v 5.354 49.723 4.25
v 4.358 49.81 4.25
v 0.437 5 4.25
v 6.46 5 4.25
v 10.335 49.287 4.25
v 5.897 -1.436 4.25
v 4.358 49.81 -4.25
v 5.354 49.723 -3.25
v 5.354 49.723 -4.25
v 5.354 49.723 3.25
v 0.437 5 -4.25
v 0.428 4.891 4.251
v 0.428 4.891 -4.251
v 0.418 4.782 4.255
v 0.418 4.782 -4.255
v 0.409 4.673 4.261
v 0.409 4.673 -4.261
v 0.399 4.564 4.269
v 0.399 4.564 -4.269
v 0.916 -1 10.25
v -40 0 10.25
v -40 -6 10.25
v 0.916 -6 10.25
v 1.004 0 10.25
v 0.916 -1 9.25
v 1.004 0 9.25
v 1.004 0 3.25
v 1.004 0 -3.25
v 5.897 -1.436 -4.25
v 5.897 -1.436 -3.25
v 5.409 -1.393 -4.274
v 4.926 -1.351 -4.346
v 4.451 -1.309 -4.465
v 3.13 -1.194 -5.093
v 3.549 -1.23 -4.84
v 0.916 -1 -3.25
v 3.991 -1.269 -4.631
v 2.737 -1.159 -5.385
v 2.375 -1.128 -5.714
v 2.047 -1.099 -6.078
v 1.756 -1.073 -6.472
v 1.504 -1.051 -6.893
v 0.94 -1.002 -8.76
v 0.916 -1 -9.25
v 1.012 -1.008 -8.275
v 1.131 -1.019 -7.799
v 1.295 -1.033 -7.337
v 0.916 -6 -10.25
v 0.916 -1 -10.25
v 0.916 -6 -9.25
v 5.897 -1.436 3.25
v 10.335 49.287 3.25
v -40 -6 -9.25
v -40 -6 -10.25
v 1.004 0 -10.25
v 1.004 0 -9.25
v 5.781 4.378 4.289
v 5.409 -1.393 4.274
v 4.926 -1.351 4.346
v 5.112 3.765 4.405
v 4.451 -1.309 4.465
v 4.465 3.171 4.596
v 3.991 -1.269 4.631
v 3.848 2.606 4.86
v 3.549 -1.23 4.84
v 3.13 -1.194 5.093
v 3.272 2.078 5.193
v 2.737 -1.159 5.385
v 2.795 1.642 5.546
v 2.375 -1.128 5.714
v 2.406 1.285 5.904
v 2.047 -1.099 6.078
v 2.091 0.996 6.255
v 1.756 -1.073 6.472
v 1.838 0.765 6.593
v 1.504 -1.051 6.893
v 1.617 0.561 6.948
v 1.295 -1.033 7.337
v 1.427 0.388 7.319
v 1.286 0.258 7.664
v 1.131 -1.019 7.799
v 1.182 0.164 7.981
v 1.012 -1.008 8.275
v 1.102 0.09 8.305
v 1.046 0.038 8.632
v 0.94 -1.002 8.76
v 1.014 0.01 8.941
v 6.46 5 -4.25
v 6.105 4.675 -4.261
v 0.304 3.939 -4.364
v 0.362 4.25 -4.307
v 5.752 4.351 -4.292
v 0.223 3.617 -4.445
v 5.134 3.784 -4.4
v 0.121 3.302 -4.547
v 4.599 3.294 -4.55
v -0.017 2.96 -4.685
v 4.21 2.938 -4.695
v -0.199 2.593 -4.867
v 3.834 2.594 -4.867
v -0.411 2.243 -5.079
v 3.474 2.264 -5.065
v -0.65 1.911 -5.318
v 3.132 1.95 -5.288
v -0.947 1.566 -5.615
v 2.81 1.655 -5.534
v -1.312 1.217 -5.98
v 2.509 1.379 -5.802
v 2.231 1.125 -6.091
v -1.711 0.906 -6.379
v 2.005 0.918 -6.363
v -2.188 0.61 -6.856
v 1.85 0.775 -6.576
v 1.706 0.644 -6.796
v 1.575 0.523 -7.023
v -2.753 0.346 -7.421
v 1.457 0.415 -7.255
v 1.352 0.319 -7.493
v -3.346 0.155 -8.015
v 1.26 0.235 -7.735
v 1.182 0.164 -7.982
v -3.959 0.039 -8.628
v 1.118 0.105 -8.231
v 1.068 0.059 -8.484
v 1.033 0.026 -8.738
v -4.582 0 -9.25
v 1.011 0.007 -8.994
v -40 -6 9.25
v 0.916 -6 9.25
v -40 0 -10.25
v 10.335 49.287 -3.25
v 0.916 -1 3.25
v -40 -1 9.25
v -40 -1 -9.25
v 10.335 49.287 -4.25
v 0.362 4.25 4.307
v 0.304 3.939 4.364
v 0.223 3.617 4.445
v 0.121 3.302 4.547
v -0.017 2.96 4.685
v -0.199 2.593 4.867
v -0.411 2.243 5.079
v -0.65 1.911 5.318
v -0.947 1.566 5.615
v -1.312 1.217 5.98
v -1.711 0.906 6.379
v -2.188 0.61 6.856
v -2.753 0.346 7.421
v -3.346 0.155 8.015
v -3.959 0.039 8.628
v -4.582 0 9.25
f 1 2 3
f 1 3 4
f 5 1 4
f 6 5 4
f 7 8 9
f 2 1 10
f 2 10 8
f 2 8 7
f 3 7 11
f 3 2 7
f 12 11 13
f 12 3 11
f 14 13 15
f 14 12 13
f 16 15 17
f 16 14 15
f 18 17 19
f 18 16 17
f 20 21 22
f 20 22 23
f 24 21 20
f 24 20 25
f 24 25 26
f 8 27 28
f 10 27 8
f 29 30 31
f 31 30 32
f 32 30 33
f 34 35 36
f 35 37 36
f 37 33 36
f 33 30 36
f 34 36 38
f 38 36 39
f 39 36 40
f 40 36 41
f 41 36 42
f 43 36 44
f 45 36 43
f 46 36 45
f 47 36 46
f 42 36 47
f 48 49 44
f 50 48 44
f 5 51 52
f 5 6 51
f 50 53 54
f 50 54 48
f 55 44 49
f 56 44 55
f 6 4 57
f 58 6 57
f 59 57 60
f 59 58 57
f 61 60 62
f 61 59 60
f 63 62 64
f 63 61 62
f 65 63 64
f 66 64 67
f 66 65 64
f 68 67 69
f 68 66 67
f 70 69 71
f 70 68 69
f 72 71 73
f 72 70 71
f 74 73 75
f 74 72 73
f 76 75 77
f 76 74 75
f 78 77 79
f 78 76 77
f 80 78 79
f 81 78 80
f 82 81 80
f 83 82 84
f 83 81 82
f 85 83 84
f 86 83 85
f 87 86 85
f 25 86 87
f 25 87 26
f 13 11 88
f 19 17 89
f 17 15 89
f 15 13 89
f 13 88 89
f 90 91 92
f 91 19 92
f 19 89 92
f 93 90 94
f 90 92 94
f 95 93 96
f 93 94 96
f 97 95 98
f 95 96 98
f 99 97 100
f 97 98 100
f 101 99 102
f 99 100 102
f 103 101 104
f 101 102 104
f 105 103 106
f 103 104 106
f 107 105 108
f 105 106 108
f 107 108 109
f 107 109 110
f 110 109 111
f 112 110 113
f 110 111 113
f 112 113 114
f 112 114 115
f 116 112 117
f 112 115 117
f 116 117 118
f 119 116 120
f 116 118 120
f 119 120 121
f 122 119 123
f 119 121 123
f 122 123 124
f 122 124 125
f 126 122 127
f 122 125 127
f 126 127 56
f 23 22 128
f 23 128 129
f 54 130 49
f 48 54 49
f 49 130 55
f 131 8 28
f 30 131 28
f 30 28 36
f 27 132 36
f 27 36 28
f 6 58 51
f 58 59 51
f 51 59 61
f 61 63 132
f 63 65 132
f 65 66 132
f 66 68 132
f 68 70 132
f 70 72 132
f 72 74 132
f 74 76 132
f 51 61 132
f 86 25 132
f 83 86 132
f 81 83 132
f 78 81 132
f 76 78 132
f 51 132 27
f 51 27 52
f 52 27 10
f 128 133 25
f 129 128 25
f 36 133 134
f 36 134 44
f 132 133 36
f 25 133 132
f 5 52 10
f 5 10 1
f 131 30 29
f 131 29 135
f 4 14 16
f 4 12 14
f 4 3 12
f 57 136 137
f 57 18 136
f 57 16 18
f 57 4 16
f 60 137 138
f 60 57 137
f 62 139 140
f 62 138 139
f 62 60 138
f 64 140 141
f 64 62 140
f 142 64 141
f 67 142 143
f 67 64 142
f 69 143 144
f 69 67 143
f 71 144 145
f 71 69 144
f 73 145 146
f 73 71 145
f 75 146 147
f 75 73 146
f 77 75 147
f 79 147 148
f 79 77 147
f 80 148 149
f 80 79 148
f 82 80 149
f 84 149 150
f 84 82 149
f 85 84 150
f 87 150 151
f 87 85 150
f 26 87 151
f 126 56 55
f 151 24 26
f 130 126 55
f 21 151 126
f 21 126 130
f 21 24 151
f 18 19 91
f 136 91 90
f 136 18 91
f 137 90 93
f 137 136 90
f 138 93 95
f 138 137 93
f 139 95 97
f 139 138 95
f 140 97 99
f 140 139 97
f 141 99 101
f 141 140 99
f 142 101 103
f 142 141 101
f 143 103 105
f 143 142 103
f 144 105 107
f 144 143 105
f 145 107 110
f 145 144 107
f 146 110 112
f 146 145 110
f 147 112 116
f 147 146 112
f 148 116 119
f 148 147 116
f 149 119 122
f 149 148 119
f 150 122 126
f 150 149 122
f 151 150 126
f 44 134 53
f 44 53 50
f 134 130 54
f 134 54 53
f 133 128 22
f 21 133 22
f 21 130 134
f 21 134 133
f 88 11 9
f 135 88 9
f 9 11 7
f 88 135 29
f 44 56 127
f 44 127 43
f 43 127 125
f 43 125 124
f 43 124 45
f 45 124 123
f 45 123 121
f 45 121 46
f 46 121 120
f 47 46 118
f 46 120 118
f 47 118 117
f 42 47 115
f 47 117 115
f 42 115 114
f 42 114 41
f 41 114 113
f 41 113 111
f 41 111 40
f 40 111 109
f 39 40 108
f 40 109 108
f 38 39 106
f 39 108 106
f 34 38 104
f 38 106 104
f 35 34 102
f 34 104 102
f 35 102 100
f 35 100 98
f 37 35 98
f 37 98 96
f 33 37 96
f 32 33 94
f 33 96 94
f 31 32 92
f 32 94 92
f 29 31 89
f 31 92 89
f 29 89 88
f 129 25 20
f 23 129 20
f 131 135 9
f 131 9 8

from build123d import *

# Parameters (mm, degrees)
F1_DEPTH = 10.25
F2_DEPTH = 4.25
F4_DEPTH = 5
F5_W     = 40.916331174
F5_H     = 1
F6_DEPTH = 5
F7_R     = 4.99999


# Not quite as in the source:
# - a fillet or chamfer is up to 0.001 mm smaller than in the source, because OpenCascade refuses the exact size


with BuildPart() as f1:
    # F0 (on Top) → F1 (new body, symmetric)
    with BuildSketch(Plane.XY):
        Polygon((0, 0), (-40, 0), (-40, -1), (0.916331174, -1), (1.0038198375, 0), align=None)
    extrude(amount=F1_DEPTH, both=True)

    # F0 (on Top) → F2 (join, symmetric)
    with BuildSketch(Plane.XY):
        Polygon((4.3577871374, 49.8097349046), (0, 0), (1.0038198375, 0), (5.3539818355, 49.7225791618), align=None)
    extrude(amount=F2_DEPTH, both=True)

    # F3 (on face) → F4 (join)
    with BuildSketch(Plane(origin=(0.9961946981, -0.0871557427, 0), x_dir=(0.0871557427, 0.9961946981, 0), z_dir=(0.9961946981, -0.0871557427, 0))):
        Polygon((50, -4.25), (50, -3.25), (-0.916331174, -3.25), (-0.916331174, -4.25), (0.0874886635, -4.25), align=None)
        Polygon((-0.916331174, 3.25), (50, 3.25), (50, 4.25), (0.0874886635, 4.25), (-0.916331174, 4.25), align=None)
    extrude(amount=F4_DEPTH)

    # F5 (on face) → F6 (join)
    with BuildSketch(Plane.XZ.offset(1)):
        with Locations((-19.541834413, 9.75)):
            Rectangle(F5_W, F5_H)
        with Locations((-19.541834413, -9.75)):
            Rectangle(F5_W, F5_H)
    extrude(amount=F6_DEPTH)

    # F7 (radius 5 in the source; OpenCascade refuses exactly that, so slightly less here)
    f7_edges = [f1.edges().sort_by_distance(p)[0] for p in [
        (0.960076, -0.5, -4.25),
        (0.960076, -0.5, 4.25),
        (0.50191, 0, 4.25),
        (0.50191, 0, -4.25),
        (0, 0, 0),
    ]]
    fillet(f7_edges, radius=F7_R)


solid = f1.part
